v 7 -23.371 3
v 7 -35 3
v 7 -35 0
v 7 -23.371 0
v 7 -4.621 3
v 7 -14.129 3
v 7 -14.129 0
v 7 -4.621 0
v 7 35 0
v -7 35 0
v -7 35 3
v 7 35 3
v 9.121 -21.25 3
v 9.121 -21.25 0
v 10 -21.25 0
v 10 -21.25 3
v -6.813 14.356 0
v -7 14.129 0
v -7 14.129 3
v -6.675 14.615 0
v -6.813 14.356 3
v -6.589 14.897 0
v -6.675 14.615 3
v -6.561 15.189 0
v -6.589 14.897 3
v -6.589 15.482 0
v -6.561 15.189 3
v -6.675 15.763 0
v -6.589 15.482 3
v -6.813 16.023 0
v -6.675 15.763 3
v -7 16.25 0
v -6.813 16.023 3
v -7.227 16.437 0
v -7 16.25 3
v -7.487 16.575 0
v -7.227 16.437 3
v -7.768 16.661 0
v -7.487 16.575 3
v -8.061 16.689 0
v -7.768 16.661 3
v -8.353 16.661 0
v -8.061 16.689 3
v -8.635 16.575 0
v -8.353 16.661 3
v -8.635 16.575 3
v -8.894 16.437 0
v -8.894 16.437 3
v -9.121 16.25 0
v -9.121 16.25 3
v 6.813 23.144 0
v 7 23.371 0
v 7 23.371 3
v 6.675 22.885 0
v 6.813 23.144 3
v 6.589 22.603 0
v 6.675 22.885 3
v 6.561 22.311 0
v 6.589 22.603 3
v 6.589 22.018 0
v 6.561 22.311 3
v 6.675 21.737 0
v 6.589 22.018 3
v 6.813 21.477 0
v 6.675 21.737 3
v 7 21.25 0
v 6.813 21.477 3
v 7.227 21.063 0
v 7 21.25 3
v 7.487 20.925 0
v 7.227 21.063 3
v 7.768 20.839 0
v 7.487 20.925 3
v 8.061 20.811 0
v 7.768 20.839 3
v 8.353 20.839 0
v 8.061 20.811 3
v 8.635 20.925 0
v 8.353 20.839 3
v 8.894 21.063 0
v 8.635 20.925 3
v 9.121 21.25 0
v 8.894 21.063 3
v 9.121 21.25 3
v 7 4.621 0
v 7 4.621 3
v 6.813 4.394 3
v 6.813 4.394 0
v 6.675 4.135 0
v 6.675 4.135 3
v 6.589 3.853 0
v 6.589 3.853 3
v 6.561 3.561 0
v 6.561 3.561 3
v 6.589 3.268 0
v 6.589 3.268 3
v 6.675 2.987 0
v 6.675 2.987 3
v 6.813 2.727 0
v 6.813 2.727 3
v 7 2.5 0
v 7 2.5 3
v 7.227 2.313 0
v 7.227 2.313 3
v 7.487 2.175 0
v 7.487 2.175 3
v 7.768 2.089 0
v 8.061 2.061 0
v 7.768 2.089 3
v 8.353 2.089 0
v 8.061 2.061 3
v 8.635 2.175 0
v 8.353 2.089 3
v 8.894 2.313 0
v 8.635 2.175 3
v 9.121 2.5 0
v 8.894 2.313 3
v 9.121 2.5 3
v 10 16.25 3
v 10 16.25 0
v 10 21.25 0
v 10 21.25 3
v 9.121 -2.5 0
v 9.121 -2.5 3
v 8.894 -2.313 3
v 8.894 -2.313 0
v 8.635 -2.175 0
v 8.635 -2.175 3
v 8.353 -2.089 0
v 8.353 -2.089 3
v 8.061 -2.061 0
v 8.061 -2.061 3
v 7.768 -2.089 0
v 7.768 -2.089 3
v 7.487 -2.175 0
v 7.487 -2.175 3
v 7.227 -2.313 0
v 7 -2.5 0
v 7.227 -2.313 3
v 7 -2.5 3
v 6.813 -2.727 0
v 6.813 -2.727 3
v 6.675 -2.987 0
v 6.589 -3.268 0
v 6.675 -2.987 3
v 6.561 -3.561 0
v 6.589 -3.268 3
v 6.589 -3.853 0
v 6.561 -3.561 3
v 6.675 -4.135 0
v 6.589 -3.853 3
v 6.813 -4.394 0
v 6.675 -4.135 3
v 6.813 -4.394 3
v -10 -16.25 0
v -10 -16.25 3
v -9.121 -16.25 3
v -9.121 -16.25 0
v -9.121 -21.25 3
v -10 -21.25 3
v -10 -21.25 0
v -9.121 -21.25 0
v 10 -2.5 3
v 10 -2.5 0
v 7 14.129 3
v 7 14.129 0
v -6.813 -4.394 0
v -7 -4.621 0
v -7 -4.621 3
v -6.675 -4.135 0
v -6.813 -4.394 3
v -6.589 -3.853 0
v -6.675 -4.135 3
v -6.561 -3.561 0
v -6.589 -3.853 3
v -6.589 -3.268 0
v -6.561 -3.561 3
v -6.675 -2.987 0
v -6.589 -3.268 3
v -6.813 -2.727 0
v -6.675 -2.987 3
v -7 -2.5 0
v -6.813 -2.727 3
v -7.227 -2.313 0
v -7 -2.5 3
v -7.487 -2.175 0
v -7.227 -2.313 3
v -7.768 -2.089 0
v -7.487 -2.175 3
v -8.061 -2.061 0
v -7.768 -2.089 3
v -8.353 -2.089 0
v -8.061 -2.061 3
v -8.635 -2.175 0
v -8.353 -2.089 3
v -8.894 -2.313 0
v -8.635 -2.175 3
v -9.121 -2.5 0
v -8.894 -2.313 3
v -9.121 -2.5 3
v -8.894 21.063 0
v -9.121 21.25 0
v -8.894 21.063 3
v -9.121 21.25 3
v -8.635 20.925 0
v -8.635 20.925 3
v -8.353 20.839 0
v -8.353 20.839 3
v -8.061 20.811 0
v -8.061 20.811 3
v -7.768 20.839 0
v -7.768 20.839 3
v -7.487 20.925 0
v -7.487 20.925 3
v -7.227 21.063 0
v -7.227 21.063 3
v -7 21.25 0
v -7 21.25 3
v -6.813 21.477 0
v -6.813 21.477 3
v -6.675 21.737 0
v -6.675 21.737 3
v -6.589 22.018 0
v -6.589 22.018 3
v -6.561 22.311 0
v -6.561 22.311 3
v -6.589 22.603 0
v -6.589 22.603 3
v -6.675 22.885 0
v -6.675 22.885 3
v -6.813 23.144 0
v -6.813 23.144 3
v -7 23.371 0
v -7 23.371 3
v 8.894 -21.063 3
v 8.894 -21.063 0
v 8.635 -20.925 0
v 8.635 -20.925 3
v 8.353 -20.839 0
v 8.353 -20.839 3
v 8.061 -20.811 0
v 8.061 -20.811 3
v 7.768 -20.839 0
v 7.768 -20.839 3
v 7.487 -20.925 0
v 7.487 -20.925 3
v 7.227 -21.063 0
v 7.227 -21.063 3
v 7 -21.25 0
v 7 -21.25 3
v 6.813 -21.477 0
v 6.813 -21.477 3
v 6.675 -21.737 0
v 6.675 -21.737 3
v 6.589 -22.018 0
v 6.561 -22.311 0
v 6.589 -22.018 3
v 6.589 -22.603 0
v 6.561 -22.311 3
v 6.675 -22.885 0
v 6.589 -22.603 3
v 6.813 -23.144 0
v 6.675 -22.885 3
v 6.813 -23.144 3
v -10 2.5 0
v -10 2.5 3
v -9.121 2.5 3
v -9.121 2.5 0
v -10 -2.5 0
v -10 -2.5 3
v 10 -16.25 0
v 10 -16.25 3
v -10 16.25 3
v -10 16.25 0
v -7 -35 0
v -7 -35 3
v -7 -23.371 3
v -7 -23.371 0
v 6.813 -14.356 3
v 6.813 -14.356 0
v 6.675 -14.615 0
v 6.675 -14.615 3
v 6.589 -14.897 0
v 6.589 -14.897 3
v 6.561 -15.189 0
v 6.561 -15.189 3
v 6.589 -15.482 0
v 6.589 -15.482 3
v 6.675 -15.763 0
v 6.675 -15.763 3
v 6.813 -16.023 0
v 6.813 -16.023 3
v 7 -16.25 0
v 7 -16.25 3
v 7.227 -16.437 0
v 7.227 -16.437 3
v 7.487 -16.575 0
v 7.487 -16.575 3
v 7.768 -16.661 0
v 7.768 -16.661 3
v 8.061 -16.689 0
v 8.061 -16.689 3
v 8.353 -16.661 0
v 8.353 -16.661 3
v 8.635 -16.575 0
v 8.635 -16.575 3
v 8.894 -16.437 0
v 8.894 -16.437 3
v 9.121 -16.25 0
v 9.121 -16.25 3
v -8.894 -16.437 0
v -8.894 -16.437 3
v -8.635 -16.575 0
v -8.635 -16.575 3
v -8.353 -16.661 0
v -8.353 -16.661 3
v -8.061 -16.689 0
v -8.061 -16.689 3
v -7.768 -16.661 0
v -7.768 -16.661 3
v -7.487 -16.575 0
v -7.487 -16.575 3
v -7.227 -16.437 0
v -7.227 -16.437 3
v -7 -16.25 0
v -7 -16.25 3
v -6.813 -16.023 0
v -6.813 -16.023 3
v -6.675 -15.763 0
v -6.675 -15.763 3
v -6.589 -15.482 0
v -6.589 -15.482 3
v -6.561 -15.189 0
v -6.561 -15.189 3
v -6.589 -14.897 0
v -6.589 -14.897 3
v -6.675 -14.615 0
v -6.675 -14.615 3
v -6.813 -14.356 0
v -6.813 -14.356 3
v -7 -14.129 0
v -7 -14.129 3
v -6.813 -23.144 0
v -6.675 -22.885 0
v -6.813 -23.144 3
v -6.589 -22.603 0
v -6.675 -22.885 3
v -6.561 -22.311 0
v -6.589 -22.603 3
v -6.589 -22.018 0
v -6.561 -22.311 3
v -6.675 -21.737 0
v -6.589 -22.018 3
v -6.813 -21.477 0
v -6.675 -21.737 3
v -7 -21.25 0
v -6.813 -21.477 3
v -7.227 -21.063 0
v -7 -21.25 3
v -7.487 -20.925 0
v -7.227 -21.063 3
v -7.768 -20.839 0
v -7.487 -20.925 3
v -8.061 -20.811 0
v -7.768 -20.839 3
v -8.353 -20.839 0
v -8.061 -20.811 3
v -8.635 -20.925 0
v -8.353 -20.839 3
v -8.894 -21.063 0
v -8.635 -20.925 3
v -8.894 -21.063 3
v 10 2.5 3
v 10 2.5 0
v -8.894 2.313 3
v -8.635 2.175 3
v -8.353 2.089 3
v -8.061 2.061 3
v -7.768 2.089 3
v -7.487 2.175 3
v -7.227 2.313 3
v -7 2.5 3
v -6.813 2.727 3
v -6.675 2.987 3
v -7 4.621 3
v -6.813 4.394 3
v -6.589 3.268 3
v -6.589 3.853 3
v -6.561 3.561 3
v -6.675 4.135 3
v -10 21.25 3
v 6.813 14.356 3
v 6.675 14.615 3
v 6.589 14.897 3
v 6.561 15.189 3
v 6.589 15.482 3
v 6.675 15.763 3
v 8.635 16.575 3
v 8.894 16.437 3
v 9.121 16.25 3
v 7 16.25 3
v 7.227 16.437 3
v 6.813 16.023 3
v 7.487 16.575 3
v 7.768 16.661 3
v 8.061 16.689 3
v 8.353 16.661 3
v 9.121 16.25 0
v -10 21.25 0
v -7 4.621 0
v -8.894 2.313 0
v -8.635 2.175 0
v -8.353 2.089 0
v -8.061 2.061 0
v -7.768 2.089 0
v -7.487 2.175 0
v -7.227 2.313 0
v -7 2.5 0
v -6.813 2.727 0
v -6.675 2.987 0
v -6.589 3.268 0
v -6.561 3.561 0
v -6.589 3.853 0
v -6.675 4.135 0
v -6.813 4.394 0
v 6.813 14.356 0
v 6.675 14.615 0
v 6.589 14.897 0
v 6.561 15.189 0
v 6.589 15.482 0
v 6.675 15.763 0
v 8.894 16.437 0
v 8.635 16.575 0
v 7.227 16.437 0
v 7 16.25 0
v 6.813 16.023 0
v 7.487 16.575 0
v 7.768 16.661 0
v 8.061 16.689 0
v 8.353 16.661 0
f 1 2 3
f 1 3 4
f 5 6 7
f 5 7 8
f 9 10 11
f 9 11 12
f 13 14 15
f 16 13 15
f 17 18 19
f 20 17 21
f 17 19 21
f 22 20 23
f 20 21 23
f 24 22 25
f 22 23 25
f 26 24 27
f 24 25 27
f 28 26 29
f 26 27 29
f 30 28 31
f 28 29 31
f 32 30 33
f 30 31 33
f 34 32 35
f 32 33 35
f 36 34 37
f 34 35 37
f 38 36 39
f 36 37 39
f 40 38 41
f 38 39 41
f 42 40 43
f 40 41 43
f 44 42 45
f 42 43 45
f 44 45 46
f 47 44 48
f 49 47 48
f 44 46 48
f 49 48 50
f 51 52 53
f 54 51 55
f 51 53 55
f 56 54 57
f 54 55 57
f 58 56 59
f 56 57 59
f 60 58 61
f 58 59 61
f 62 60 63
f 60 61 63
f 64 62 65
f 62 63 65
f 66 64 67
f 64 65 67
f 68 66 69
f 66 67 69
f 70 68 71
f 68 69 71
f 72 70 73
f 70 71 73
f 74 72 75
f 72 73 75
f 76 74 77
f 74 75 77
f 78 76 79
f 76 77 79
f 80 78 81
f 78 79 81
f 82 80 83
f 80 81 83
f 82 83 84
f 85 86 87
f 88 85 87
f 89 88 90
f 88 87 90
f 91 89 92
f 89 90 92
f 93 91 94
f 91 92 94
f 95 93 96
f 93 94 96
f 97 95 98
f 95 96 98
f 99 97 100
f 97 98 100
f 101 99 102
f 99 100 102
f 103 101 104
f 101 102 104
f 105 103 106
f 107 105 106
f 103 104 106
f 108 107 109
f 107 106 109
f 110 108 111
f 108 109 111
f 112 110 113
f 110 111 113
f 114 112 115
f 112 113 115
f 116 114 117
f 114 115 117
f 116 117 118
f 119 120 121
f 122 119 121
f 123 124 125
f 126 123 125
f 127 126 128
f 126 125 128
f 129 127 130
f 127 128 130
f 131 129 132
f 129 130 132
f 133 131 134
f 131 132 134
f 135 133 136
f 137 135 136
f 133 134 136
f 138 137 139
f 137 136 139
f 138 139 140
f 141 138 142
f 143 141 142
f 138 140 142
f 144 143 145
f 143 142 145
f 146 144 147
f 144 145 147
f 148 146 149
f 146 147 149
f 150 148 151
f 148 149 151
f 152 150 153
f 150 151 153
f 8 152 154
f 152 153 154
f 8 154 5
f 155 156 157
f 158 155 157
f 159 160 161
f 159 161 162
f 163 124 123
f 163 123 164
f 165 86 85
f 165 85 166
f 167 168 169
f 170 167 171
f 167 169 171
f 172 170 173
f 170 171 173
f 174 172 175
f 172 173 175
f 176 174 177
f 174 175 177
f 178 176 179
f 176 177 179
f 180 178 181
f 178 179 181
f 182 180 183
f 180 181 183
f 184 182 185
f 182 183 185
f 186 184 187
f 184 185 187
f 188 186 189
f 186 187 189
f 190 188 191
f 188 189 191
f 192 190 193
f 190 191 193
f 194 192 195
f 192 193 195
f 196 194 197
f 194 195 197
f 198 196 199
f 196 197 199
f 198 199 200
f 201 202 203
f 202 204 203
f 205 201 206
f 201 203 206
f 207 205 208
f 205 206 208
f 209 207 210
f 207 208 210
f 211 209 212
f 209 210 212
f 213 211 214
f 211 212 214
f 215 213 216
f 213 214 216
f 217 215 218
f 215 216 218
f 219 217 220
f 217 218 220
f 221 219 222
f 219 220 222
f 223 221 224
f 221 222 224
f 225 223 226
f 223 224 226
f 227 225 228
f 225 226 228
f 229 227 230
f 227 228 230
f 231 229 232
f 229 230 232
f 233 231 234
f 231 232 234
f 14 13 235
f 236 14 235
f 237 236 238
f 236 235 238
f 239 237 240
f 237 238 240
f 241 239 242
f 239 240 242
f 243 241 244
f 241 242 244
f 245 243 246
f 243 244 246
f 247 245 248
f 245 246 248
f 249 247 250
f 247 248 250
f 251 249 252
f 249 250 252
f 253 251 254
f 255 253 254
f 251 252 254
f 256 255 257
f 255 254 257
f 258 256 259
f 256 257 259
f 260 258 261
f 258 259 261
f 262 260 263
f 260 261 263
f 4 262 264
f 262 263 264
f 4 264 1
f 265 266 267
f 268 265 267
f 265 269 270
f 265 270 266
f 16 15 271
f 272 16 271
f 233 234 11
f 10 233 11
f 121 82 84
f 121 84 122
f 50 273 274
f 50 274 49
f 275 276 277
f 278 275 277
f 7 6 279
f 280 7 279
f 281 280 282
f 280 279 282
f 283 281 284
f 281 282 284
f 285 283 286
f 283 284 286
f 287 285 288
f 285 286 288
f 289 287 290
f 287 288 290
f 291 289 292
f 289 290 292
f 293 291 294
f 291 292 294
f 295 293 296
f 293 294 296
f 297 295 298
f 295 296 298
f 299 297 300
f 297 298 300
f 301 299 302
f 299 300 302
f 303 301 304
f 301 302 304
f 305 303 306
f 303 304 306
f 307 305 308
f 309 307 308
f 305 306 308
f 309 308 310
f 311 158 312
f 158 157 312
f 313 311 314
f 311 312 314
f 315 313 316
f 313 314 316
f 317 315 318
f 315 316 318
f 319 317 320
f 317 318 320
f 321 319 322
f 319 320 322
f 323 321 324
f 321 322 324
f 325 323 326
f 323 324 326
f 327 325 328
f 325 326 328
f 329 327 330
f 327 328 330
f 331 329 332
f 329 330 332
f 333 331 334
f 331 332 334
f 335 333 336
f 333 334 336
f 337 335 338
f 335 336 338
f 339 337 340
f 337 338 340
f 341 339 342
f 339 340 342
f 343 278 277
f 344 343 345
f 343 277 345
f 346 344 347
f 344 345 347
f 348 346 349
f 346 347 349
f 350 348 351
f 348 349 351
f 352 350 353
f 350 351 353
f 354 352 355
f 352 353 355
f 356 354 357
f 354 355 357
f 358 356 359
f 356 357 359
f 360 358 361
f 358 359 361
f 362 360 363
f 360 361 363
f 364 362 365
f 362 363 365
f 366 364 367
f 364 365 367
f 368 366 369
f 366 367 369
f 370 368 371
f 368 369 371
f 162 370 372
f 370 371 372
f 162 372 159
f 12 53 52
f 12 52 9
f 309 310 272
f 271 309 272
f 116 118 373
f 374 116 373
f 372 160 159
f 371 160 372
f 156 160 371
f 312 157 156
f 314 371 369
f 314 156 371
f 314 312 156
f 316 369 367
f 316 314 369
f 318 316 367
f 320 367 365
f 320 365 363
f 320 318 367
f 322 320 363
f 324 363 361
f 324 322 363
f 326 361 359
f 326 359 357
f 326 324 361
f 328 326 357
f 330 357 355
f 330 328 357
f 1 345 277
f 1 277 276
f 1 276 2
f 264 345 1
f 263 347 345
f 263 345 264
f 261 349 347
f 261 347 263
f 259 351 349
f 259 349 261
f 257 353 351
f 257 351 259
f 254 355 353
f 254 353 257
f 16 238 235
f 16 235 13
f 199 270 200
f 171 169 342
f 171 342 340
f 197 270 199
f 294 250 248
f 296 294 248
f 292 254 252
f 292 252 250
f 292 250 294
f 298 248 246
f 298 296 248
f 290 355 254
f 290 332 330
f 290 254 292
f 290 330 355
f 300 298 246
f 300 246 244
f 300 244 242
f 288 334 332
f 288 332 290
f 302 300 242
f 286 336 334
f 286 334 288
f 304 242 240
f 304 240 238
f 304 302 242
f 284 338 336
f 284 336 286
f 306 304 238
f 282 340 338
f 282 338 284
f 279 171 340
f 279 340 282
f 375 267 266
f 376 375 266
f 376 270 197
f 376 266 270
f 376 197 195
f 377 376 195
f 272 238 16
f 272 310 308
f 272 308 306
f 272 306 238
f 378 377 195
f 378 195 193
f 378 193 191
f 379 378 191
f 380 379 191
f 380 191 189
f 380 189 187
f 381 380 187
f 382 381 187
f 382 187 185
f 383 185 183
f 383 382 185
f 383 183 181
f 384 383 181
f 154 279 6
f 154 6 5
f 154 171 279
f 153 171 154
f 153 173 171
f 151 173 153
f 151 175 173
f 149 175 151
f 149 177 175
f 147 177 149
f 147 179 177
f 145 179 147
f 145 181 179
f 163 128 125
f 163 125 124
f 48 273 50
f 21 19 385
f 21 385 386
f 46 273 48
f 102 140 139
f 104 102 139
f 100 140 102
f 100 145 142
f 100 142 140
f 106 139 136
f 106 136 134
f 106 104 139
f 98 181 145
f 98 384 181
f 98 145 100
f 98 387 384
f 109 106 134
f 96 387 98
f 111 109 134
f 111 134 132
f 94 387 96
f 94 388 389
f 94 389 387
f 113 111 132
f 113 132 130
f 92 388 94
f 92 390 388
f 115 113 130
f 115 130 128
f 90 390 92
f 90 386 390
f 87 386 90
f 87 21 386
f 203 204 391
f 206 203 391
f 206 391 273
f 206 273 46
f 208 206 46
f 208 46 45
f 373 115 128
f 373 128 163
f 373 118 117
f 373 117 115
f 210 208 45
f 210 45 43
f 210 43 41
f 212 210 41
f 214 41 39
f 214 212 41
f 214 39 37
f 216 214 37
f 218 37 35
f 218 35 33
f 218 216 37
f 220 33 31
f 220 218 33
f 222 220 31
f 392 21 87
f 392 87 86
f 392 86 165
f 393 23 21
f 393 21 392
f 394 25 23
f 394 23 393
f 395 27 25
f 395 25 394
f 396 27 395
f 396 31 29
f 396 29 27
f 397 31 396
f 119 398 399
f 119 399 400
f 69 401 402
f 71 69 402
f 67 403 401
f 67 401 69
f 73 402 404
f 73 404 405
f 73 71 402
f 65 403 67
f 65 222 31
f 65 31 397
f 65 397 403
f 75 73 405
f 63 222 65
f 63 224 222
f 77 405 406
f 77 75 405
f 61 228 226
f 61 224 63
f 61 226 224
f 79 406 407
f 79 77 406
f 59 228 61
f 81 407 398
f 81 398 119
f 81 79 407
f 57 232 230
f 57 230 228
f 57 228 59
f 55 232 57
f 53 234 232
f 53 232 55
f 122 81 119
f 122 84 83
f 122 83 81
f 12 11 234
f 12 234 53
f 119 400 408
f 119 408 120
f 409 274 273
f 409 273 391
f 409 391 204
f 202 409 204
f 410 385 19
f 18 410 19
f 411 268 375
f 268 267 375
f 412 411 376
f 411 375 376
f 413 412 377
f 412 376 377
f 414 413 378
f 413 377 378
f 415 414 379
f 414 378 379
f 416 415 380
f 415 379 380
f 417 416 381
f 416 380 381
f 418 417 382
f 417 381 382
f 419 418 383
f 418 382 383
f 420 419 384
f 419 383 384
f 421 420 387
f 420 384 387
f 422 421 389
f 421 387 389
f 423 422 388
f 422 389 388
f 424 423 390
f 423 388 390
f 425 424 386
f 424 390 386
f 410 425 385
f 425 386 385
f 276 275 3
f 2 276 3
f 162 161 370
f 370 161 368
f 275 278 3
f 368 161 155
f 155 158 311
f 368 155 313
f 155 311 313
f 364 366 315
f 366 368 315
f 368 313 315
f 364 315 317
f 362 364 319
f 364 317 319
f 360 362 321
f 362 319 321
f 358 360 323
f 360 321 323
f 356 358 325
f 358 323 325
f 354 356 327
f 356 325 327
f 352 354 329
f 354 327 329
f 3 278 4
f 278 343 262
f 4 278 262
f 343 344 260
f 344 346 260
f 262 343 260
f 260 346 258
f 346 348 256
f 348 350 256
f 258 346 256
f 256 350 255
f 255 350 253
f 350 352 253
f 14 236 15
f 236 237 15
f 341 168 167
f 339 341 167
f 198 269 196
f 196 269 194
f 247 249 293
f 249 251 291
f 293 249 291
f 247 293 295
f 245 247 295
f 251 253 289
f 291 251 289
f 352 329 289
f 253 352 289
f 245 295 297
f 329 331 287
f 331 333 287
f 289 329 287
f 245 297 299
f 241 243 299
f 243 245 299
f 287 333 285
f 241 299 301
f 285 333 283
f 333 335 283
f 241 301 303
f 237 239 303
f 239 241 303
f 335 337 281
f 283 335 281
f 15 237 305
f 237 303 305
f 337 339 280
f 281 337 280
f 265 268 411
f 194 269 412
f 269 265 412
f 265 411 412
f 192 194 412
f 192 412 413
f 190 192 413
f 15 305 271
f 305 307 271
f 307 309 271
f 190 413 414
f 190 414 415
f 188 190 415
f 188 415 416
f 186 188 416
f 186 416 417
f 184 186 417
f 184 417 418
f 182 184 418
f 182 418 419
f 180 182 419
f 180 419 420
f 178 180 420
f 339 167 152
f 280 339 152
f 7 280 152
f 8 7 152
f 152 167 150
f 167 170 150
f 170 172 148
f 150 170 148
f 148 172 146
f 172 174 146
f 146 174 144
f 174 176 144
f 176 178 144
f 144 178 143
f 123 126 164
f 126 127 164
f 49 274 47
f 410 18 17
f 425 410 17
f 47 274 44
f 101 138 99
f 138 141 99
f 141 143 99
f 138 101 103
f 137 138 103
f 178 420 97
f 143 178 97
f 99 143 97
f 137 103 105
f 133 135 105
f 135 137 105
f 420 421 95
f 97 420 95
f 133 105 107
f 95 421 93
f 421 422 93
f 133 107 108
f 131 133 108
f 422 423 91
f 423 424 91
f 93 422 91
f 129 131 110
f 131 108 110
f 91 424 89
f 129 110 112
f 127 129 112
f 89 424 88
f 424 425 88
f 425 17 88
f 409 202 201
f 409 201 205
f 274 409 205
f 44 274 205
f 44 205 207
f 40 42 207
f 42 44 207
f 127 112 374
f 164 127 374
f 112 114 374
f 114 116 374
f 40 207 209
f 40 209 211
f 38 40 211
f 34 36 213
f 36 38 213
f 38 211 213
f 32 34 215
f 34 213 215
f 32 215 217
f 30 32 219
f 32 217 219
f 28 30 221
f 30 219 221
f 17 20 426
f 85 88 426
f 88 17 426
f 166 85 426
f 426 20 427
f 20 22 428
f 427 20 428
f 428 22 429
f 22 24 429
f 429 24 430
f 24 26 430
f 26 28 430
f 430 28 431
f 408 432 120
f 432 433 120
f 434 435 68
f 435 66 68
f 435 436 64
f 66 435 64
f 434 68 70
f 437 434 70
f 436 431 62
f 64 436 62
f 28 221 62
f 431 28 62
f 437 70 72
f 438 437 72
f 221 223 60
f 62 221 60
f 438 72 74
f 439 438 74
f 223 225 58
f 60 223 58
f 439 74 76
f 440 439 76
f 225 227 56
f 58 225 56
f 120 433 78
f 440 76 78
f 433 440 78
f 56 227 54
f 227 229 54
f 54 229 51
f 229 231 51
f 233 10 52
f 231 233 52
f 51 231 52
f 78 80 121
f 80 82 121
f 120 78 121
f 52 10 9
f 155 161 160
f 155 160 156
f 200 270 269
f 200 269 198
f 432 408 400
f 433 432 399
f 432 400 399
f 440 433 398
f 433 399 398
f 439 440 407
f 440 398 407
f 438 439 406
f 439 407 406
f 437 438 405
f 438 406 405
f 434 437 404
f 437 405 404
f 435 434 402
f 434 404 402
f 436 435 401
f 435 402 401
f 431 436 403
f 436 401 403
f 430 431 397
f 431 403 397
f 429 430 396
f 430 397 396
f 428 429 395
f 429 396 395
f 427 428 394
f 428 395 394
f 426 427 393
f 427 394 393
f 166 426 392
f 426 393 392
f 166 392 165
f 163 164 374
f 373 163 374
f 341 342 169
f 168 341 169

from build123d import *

# Parameters (mm, degrees)
CROQUIS1_W              = 20
CROQUIS1_H              = 70
SALIENTE_EXTRUIR1_DEPTH = 3
CROQUIS2_W              = 3
CROQUIS2_H              = 13.75
CORTAR_EXTRUIR1_DEPTH   = 4
CROQUIS3_R              = 1.5
CORTAR_EXTRUIR2_DEPTH   = 4


with BuildPart() as part:
    # Croquis1 → Saliente-Extruir1 (new body)
    with BuildSketch(Plane.XY):
        Rectangle(CROQUIS1_W, CROQUIS1_H)
    extrude(amount=SALIENTE_EXTRUIR1_DEPTH)

    # Croquis2 → Cortar-Extruir1 (cut, through all)
    with BuildSketch(Plane.XY.offset(3)):
        with Locations((8.5, 28.125)):
            Rectangle(CROQUIS2_W, CROQUIS2_H)
        with Locations((8.5, 9.375)):
            Rectangle(CROQUIS2_W, CROQUIS2_H)
        with Locations((8.5, -28.125)):
            Rectangle(CROQUIS2_W, CROQUIS2_H)
        with Locations((8.5, -9.375)):
            Rectangle(CROQUIS2_W, CROQUIS2_H)
        with Locations((-8.5, -9.375)):
            Rectangle(CROQUIS2_W, CROQUIS2_H)
        with Locations((-8.5, -28.125)):
            Rectangle(CROQUIS2_W, CROQUIS2_H)
        with Locations((-8.5, 9.375)):
            Rectangle(CROQUIS2_W, CROQUIS2_H)
        with Locations((-8.5, 28.125)):
            Rectangle(CROQUIS2_W, CROQUIS2_H)
    extrude(amount=-CORTAR_EXTRUIR1_DEPTH, mode=Mode.SUBTRACT)

    # Croquis3 → Cortar-Extruir2 (cut, through all)
    with BuildSketch(Plane.XY.offset(3)):
        with Locations((8.060660172, 22.310660172)):
            Circle(CROQUIS3_R)
        with Locations((8.060660172, 15.189339828)):
            Circle(CROQUIS3_R)
        with Locations((8.060660172, 3.560660172)):
            Circle(CROQUIS3_R)
        with Locations((8.060660172, -3.560660172)):
            Circle(CROQUIS3_R)
        with Locations((8.060660172, -15.189339828)):
            Circle(CROQUIS3_R)
        with Locations((8.060660172, -22.310660172)):
            Circle(CROQUIS3_R)
        with Locations((-8.060660172, -22.310660172)):
            Circle(CROQUIS3_R)
        with Locations((-8.060660172, -15.189339828)):
            Circle(CROQUIS3_R)
        with Locations((-8.060660172, -3.560660172)):
            Circle(CROQUIS3_R)
        with Locations((-8.060660172, 3.560660172)):
            Circle(CROQUIS3_R)
        with Locations((-8.060660172, 15.189339828)):
            Circle(CROQUIS3_R)
        with Locations((-8.060660172, 22.310660172)):
            Circle(CROQUIS3_R)
    extrude(amount=-CORTAR_EXTRUIR2_DEPTH, mode=Mode.SUBTRACT)


solid = part.part
